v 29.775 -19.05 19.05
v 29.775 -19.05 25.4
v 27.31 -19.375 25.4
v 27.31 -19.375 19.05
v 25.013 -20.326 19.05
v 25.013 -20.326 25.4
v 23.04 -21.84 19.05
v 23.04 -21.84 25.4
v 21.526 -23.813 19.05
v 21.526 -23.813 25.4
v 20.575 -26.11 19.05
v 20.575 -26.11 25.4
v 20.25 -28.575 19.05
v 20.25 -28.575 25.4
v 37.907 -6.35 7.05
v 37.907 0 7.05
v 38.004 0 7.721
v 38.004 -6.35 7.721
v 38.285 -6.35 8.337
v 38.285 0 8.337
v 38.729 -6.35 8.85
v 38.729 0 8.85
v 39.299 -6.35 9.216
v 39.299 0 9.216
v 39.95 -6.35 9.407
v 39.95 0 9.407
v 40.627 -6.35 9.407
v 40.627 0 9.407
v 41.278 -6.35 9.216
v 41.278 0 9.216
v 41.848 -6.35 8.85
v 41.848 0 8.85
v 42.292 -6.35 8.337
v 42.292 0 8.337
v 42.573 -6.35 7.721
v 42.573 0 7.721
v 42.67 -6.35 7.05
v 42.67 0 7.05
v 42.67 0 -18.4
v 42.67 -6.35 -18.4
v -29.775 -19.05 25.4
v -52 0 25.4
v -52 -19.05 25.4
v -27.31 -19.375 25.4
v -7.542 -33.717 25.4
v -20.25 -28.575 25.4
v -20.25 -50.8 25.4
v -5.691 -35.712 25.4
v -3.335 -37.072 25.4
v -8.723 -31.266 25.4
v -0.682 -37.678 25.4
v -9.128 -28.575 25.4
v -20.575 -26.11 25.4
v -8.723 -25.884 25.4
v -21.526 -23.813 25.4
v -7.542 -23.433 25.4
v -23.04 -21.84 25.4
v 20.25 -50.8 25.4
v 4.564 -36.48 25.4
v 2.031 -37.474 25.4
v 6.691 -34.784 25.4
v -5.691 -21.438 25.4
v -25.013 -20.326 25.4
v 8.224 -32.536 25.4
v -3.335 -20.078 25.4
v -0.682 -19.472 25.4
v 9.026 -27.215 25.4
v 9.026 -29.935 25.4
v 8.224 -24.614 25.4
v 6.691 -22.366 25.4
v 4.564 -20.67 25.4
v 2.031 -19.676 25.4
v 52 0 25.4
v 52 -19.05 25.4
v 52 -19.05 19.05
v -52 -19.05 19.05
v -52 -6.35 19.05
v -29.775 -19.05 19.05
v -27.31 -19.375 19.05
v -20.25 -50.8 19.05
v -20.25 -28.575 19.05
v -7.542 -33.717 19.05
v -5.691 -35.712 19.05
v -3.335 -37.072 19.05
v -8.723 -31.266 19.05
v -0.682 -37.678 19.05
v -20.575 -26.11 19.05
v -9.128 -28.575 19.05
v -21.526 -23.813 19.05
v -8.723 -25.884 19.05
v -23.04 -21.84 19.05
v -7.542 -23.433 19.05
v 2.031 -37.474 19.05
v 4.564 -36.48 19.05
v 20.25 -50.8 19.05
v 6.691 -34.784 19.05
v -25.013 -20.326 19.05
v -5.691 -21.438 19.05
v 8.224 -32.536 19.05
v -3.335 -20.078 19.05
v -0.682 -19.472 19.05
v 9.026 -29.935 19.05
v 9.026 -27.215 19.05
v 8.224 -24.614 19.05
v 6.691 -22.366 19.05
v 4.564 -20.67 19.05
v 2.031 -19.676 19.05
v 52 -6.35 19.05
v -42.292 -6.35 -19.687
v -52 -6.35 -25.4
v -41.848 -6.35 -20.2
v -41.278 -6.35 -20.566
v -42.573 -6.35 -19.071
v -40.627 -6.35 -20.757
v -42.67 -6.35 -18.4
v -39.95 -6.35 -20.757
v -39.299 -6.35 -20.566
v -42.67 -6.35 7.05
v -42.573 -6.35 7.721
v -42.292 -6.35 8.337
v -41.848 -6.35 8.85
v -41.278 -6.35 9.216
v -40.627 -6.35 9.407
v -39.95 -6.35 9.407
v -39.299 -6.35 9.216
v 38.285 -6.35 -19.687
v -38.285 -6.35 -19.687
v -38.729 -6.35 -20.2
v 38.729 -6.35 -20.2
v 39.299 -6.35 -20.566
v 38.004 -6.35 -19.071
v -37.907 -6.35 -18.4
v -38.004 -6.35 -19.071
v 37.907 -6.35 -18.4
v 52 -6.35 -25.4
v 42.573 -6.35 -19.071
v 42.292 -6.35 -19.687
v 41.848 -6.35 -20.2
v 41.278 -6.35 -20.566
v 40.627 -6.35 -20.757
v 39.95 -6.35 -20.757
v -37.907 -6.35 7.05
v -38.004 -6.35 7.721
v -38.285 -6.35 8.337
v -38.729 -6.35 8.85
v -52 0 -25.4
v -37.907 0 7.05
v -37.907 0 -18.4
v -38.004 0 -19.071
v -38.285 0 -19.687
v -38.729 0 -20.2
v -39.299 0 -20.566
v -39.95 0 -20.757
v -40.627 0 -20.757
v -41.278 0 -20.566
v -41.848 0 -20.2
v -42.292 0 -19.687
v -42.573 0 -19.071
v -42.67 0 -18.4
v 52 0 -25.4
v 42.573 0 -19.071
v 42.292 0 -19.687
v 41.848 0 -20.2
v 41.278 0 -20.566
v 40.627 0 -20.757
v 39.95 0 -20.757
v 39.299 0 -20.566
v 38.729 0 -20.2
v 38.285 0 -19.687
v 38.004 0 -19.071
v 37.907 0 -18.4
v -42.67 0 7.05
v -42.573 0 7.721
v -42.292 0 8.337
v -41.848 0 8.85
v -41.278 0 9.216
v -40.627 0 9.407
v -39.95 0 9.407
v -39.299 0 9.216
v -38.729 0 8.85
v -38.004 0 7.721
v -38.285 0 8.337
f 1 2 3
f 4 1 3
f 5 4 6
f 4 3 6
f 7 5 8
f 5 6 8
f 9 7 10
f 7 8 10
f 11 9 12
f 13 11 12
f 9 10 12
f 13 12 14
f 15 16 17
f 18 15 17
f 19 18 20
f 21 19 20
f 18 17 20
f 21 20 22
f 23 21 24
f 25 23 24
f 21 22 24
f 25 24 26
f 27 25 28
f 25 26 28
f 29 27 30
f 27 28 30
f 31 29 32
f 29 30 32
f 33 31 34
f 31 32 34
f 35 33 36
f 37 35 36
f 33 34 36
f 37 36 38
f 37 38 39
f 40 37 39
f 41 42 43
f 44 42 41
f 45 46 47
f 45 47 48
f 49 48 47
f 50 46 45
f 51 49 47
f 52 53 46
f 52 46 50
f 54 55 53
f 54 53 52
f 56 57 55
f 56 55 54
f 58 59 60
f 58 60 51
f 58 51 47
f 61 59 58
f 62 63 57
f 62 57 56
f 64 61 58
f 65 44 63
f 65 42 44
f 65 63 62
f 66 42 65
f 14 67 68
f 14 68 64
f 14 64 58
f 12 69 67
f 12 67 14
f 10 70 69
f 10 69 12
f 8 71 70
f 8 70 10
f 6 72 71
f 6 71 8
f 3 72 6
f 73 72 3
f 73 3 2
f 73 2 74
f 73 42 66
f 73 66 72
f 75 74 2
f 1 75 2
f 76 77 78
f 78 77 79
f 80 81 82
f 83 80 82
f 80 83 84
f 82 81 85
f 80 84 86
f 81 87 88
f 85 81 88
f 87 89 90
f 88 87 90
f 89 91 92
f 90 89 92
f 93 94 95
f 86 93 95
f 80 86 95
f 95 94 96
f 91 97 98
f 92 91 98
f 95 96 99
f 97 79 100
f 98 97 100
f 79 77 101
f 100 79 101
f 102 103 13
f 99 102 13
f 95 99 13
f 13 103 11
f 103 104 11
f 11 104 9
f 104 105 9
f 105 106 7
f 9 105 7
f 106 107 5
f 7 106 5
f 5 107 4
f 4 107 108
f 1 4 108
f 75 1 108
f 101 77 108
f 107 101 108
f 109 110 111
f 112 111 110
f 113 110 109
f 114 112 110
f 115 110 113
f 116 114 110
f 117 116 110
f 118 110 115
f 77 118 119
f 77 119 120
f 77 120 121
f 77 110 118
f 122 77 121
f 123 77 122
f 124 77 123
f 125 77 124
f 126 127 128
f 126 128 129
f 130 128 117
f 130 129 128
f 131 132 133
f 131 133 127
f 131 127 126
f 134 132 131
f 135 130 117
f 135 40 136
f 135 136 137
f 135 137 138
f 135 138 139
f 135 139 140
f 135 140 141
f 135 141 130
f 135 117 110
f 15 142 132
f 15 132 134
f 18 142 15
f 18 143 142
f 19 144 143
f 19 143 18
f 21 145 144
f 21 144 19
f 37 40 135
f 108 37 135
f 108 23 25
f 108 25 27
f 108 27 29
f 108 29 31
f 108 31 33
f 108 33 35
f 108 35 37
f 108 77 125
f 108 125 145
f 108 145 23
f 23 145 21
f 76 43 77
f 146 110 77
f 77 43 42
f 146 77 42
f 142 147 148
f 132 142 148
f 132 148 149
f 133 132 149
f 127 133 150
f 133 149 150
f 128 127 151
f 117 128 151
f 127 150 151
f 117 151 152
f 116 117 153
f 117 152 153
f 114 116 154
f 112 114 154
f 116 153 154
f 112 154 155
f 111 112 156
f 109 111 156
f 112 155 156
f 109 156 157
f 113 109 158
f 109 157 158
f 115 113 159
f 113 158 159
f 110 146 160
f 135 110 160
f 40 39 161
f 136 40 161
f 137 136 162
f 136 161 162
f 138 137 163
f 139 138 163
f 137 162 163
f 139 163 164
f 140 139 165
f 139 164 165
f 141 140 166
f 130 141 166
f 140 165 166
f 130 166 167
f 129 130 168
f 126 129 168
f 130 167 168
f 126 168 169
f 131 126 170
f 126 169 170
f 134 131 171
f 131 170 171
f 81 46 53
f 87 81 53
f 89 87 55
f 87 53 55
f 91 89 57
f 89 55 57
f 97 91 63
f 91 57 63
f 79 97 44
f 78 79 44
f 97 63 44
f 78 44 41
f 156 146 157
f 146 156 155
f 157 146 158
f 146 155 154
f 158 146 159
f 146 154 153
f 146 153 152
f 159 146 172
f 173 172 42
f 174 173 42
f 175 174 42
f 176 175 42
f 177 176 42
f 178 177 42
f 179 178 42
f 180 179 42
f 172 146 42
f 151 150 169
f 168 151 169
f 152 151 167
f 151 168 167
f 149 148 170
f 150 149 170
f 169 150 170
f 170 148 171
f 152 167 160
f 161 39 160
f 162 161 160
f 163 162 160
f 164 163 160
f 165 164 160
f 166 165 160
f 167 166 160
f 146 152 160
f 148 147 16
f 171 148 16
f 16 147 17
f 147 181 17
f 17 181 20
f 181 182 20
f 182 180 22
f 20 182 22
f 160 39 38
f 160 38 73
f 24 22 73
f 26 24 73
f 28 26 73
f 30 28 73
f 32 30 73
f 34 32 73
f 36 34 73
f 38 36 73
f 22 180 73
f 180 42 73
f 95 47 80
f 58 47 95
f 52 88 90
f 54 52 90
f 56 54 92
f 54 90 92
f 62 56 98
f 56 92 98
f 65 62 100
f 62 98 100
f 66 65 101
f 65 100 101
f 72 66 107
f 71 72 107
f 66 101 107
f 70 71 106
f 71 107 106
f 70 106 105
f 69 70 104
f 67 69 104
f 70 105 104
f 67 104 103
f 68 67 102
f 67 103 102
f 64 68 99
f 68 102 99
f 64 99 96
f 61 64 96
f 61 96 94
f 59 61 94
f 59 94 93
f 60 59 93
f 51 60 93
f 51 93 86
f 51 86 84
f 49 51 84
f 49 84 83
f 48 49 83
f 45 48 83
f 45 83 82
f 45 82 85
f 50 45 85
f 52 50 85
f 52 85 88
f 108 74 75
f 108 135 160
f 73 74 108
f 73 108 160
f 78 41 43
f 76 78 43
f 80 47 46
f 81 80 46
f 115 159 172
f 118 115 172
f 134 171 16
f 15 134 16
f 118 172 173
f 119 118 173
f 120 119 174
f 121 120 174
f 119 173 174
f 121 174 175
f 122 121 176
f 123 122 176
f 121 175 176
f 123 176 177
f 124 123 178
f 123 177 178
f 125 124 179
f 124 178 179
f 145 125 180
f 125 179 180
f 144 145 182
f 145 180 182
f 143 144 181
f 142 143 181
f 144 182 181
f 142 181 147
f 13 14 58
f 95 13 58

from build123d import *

# Parameters (mm, degrees)
F0_W     = 104
F0_H     = 50.8
F1_DEPTH = 6.35
F2_W     = 104
F2_H     = 44.45
F3_DEPTH = 6.35
F6_D     = 18.25625
F8_DEPTH = 50.801
F9_DEPTH = 50.801


# Not quite as in the source:
# - a length typed as a fraction of an inch, garbled in the dataset ("3 / 203.2 mm" for 3/8 in), is restored


with BuildPart() as f1:
    # F0 (on Front) → F1 (new body)
    with BuildSketch(Plane.XZ):
        Rectangle(F0_W, F0_H)
    extrude(amount=F1_DEPTH)

    # F2 (on face) → F3 (join)
    with BuildSketch(Plane.XY.offset(25.4)):
        with Locations((0, -28.575)):
            Rectangle(F2_W, F2_H)
    extrude(amount=-F3_DEPTH)

    # F6 (through all)
    with Locations(Plane.XY.offset(25.4)):
        with Locations((0, -28.575)):
            Hole(F6_D / 2)

    # F7 (on face) → F8 (cut, through all)
    with BuildSketch(Plane.XY.offset(25.4)):
        with BuildLine():
            Line((-29.775, -19.05), (-52, -19.05))
            Line((-52, -19.05), (-52, -50.8))
            Line((-52, -50.8), (-20.25, -50.8))
            Line((-20.25, -50.8), (-20.25, -28.575))
            ThreePointArc((-20.25, -28.575), (-23.0398079092, -21.8398079092), (-29.775, -19.05))
        make_face()
        with BuildLine():
            Line((20.25, -28.575), (20.25, -50.8))
            Line((20.25, -50.8), (52, -50.8))
            Line((52, -50.8), (52, -19.05))
            Line((52, -19.05), (29.775, -19.05))
            ThreePointArc((29.775, -19.05), (23.0398079092, -21.8398079092), (20.25, -28.575))
        make_face()
    extrude(amount=-F8_DEPTH, mode=Mode.SUBTRACT)

    # F4 (on face) → F9 (cut, through all)
    with BuildSketch(Plane(origin=(0, 0, 0), x_dir=(-1, 0, 0), z_dir=(0, 1, 0))):
        with BuildLine():
            ThreePointArc((37.9072132349, -18.4), (40.2884632349, -20.78125), (42.6697132349, -18.4))
            Line((42.6697132349, -18.4), (42.6697132349, 7.05))
            ThreePointArc((42.6697132349, 7.05), (40.2884632349, 9.43125), (37.9072132349, 7.05))
            Line((37.9072132349, 7.05), (37.9072132349, -18.4))
        make_face()
        with BuildLine():
            ThreePointArc((-42.6697132349, -18.4), (-40.2884632349, -20.78125), (-37.9072132349, -18.4))
            Line((-37.9072132349, -18.4), (-37.9072132349, 7.05))
            ThreePointArc((-37.9072132349, 7.05), (-40.2884632349, 9.43125), (-42.6697132349, 7.05))
            Line((-42.6697132349, 7.05), (-42.6697132349, -18.4))
        make_face()
    extrude(amount=-F9_DEPTH, mode=Mode.SUBTRACT)


solid = f1.part
